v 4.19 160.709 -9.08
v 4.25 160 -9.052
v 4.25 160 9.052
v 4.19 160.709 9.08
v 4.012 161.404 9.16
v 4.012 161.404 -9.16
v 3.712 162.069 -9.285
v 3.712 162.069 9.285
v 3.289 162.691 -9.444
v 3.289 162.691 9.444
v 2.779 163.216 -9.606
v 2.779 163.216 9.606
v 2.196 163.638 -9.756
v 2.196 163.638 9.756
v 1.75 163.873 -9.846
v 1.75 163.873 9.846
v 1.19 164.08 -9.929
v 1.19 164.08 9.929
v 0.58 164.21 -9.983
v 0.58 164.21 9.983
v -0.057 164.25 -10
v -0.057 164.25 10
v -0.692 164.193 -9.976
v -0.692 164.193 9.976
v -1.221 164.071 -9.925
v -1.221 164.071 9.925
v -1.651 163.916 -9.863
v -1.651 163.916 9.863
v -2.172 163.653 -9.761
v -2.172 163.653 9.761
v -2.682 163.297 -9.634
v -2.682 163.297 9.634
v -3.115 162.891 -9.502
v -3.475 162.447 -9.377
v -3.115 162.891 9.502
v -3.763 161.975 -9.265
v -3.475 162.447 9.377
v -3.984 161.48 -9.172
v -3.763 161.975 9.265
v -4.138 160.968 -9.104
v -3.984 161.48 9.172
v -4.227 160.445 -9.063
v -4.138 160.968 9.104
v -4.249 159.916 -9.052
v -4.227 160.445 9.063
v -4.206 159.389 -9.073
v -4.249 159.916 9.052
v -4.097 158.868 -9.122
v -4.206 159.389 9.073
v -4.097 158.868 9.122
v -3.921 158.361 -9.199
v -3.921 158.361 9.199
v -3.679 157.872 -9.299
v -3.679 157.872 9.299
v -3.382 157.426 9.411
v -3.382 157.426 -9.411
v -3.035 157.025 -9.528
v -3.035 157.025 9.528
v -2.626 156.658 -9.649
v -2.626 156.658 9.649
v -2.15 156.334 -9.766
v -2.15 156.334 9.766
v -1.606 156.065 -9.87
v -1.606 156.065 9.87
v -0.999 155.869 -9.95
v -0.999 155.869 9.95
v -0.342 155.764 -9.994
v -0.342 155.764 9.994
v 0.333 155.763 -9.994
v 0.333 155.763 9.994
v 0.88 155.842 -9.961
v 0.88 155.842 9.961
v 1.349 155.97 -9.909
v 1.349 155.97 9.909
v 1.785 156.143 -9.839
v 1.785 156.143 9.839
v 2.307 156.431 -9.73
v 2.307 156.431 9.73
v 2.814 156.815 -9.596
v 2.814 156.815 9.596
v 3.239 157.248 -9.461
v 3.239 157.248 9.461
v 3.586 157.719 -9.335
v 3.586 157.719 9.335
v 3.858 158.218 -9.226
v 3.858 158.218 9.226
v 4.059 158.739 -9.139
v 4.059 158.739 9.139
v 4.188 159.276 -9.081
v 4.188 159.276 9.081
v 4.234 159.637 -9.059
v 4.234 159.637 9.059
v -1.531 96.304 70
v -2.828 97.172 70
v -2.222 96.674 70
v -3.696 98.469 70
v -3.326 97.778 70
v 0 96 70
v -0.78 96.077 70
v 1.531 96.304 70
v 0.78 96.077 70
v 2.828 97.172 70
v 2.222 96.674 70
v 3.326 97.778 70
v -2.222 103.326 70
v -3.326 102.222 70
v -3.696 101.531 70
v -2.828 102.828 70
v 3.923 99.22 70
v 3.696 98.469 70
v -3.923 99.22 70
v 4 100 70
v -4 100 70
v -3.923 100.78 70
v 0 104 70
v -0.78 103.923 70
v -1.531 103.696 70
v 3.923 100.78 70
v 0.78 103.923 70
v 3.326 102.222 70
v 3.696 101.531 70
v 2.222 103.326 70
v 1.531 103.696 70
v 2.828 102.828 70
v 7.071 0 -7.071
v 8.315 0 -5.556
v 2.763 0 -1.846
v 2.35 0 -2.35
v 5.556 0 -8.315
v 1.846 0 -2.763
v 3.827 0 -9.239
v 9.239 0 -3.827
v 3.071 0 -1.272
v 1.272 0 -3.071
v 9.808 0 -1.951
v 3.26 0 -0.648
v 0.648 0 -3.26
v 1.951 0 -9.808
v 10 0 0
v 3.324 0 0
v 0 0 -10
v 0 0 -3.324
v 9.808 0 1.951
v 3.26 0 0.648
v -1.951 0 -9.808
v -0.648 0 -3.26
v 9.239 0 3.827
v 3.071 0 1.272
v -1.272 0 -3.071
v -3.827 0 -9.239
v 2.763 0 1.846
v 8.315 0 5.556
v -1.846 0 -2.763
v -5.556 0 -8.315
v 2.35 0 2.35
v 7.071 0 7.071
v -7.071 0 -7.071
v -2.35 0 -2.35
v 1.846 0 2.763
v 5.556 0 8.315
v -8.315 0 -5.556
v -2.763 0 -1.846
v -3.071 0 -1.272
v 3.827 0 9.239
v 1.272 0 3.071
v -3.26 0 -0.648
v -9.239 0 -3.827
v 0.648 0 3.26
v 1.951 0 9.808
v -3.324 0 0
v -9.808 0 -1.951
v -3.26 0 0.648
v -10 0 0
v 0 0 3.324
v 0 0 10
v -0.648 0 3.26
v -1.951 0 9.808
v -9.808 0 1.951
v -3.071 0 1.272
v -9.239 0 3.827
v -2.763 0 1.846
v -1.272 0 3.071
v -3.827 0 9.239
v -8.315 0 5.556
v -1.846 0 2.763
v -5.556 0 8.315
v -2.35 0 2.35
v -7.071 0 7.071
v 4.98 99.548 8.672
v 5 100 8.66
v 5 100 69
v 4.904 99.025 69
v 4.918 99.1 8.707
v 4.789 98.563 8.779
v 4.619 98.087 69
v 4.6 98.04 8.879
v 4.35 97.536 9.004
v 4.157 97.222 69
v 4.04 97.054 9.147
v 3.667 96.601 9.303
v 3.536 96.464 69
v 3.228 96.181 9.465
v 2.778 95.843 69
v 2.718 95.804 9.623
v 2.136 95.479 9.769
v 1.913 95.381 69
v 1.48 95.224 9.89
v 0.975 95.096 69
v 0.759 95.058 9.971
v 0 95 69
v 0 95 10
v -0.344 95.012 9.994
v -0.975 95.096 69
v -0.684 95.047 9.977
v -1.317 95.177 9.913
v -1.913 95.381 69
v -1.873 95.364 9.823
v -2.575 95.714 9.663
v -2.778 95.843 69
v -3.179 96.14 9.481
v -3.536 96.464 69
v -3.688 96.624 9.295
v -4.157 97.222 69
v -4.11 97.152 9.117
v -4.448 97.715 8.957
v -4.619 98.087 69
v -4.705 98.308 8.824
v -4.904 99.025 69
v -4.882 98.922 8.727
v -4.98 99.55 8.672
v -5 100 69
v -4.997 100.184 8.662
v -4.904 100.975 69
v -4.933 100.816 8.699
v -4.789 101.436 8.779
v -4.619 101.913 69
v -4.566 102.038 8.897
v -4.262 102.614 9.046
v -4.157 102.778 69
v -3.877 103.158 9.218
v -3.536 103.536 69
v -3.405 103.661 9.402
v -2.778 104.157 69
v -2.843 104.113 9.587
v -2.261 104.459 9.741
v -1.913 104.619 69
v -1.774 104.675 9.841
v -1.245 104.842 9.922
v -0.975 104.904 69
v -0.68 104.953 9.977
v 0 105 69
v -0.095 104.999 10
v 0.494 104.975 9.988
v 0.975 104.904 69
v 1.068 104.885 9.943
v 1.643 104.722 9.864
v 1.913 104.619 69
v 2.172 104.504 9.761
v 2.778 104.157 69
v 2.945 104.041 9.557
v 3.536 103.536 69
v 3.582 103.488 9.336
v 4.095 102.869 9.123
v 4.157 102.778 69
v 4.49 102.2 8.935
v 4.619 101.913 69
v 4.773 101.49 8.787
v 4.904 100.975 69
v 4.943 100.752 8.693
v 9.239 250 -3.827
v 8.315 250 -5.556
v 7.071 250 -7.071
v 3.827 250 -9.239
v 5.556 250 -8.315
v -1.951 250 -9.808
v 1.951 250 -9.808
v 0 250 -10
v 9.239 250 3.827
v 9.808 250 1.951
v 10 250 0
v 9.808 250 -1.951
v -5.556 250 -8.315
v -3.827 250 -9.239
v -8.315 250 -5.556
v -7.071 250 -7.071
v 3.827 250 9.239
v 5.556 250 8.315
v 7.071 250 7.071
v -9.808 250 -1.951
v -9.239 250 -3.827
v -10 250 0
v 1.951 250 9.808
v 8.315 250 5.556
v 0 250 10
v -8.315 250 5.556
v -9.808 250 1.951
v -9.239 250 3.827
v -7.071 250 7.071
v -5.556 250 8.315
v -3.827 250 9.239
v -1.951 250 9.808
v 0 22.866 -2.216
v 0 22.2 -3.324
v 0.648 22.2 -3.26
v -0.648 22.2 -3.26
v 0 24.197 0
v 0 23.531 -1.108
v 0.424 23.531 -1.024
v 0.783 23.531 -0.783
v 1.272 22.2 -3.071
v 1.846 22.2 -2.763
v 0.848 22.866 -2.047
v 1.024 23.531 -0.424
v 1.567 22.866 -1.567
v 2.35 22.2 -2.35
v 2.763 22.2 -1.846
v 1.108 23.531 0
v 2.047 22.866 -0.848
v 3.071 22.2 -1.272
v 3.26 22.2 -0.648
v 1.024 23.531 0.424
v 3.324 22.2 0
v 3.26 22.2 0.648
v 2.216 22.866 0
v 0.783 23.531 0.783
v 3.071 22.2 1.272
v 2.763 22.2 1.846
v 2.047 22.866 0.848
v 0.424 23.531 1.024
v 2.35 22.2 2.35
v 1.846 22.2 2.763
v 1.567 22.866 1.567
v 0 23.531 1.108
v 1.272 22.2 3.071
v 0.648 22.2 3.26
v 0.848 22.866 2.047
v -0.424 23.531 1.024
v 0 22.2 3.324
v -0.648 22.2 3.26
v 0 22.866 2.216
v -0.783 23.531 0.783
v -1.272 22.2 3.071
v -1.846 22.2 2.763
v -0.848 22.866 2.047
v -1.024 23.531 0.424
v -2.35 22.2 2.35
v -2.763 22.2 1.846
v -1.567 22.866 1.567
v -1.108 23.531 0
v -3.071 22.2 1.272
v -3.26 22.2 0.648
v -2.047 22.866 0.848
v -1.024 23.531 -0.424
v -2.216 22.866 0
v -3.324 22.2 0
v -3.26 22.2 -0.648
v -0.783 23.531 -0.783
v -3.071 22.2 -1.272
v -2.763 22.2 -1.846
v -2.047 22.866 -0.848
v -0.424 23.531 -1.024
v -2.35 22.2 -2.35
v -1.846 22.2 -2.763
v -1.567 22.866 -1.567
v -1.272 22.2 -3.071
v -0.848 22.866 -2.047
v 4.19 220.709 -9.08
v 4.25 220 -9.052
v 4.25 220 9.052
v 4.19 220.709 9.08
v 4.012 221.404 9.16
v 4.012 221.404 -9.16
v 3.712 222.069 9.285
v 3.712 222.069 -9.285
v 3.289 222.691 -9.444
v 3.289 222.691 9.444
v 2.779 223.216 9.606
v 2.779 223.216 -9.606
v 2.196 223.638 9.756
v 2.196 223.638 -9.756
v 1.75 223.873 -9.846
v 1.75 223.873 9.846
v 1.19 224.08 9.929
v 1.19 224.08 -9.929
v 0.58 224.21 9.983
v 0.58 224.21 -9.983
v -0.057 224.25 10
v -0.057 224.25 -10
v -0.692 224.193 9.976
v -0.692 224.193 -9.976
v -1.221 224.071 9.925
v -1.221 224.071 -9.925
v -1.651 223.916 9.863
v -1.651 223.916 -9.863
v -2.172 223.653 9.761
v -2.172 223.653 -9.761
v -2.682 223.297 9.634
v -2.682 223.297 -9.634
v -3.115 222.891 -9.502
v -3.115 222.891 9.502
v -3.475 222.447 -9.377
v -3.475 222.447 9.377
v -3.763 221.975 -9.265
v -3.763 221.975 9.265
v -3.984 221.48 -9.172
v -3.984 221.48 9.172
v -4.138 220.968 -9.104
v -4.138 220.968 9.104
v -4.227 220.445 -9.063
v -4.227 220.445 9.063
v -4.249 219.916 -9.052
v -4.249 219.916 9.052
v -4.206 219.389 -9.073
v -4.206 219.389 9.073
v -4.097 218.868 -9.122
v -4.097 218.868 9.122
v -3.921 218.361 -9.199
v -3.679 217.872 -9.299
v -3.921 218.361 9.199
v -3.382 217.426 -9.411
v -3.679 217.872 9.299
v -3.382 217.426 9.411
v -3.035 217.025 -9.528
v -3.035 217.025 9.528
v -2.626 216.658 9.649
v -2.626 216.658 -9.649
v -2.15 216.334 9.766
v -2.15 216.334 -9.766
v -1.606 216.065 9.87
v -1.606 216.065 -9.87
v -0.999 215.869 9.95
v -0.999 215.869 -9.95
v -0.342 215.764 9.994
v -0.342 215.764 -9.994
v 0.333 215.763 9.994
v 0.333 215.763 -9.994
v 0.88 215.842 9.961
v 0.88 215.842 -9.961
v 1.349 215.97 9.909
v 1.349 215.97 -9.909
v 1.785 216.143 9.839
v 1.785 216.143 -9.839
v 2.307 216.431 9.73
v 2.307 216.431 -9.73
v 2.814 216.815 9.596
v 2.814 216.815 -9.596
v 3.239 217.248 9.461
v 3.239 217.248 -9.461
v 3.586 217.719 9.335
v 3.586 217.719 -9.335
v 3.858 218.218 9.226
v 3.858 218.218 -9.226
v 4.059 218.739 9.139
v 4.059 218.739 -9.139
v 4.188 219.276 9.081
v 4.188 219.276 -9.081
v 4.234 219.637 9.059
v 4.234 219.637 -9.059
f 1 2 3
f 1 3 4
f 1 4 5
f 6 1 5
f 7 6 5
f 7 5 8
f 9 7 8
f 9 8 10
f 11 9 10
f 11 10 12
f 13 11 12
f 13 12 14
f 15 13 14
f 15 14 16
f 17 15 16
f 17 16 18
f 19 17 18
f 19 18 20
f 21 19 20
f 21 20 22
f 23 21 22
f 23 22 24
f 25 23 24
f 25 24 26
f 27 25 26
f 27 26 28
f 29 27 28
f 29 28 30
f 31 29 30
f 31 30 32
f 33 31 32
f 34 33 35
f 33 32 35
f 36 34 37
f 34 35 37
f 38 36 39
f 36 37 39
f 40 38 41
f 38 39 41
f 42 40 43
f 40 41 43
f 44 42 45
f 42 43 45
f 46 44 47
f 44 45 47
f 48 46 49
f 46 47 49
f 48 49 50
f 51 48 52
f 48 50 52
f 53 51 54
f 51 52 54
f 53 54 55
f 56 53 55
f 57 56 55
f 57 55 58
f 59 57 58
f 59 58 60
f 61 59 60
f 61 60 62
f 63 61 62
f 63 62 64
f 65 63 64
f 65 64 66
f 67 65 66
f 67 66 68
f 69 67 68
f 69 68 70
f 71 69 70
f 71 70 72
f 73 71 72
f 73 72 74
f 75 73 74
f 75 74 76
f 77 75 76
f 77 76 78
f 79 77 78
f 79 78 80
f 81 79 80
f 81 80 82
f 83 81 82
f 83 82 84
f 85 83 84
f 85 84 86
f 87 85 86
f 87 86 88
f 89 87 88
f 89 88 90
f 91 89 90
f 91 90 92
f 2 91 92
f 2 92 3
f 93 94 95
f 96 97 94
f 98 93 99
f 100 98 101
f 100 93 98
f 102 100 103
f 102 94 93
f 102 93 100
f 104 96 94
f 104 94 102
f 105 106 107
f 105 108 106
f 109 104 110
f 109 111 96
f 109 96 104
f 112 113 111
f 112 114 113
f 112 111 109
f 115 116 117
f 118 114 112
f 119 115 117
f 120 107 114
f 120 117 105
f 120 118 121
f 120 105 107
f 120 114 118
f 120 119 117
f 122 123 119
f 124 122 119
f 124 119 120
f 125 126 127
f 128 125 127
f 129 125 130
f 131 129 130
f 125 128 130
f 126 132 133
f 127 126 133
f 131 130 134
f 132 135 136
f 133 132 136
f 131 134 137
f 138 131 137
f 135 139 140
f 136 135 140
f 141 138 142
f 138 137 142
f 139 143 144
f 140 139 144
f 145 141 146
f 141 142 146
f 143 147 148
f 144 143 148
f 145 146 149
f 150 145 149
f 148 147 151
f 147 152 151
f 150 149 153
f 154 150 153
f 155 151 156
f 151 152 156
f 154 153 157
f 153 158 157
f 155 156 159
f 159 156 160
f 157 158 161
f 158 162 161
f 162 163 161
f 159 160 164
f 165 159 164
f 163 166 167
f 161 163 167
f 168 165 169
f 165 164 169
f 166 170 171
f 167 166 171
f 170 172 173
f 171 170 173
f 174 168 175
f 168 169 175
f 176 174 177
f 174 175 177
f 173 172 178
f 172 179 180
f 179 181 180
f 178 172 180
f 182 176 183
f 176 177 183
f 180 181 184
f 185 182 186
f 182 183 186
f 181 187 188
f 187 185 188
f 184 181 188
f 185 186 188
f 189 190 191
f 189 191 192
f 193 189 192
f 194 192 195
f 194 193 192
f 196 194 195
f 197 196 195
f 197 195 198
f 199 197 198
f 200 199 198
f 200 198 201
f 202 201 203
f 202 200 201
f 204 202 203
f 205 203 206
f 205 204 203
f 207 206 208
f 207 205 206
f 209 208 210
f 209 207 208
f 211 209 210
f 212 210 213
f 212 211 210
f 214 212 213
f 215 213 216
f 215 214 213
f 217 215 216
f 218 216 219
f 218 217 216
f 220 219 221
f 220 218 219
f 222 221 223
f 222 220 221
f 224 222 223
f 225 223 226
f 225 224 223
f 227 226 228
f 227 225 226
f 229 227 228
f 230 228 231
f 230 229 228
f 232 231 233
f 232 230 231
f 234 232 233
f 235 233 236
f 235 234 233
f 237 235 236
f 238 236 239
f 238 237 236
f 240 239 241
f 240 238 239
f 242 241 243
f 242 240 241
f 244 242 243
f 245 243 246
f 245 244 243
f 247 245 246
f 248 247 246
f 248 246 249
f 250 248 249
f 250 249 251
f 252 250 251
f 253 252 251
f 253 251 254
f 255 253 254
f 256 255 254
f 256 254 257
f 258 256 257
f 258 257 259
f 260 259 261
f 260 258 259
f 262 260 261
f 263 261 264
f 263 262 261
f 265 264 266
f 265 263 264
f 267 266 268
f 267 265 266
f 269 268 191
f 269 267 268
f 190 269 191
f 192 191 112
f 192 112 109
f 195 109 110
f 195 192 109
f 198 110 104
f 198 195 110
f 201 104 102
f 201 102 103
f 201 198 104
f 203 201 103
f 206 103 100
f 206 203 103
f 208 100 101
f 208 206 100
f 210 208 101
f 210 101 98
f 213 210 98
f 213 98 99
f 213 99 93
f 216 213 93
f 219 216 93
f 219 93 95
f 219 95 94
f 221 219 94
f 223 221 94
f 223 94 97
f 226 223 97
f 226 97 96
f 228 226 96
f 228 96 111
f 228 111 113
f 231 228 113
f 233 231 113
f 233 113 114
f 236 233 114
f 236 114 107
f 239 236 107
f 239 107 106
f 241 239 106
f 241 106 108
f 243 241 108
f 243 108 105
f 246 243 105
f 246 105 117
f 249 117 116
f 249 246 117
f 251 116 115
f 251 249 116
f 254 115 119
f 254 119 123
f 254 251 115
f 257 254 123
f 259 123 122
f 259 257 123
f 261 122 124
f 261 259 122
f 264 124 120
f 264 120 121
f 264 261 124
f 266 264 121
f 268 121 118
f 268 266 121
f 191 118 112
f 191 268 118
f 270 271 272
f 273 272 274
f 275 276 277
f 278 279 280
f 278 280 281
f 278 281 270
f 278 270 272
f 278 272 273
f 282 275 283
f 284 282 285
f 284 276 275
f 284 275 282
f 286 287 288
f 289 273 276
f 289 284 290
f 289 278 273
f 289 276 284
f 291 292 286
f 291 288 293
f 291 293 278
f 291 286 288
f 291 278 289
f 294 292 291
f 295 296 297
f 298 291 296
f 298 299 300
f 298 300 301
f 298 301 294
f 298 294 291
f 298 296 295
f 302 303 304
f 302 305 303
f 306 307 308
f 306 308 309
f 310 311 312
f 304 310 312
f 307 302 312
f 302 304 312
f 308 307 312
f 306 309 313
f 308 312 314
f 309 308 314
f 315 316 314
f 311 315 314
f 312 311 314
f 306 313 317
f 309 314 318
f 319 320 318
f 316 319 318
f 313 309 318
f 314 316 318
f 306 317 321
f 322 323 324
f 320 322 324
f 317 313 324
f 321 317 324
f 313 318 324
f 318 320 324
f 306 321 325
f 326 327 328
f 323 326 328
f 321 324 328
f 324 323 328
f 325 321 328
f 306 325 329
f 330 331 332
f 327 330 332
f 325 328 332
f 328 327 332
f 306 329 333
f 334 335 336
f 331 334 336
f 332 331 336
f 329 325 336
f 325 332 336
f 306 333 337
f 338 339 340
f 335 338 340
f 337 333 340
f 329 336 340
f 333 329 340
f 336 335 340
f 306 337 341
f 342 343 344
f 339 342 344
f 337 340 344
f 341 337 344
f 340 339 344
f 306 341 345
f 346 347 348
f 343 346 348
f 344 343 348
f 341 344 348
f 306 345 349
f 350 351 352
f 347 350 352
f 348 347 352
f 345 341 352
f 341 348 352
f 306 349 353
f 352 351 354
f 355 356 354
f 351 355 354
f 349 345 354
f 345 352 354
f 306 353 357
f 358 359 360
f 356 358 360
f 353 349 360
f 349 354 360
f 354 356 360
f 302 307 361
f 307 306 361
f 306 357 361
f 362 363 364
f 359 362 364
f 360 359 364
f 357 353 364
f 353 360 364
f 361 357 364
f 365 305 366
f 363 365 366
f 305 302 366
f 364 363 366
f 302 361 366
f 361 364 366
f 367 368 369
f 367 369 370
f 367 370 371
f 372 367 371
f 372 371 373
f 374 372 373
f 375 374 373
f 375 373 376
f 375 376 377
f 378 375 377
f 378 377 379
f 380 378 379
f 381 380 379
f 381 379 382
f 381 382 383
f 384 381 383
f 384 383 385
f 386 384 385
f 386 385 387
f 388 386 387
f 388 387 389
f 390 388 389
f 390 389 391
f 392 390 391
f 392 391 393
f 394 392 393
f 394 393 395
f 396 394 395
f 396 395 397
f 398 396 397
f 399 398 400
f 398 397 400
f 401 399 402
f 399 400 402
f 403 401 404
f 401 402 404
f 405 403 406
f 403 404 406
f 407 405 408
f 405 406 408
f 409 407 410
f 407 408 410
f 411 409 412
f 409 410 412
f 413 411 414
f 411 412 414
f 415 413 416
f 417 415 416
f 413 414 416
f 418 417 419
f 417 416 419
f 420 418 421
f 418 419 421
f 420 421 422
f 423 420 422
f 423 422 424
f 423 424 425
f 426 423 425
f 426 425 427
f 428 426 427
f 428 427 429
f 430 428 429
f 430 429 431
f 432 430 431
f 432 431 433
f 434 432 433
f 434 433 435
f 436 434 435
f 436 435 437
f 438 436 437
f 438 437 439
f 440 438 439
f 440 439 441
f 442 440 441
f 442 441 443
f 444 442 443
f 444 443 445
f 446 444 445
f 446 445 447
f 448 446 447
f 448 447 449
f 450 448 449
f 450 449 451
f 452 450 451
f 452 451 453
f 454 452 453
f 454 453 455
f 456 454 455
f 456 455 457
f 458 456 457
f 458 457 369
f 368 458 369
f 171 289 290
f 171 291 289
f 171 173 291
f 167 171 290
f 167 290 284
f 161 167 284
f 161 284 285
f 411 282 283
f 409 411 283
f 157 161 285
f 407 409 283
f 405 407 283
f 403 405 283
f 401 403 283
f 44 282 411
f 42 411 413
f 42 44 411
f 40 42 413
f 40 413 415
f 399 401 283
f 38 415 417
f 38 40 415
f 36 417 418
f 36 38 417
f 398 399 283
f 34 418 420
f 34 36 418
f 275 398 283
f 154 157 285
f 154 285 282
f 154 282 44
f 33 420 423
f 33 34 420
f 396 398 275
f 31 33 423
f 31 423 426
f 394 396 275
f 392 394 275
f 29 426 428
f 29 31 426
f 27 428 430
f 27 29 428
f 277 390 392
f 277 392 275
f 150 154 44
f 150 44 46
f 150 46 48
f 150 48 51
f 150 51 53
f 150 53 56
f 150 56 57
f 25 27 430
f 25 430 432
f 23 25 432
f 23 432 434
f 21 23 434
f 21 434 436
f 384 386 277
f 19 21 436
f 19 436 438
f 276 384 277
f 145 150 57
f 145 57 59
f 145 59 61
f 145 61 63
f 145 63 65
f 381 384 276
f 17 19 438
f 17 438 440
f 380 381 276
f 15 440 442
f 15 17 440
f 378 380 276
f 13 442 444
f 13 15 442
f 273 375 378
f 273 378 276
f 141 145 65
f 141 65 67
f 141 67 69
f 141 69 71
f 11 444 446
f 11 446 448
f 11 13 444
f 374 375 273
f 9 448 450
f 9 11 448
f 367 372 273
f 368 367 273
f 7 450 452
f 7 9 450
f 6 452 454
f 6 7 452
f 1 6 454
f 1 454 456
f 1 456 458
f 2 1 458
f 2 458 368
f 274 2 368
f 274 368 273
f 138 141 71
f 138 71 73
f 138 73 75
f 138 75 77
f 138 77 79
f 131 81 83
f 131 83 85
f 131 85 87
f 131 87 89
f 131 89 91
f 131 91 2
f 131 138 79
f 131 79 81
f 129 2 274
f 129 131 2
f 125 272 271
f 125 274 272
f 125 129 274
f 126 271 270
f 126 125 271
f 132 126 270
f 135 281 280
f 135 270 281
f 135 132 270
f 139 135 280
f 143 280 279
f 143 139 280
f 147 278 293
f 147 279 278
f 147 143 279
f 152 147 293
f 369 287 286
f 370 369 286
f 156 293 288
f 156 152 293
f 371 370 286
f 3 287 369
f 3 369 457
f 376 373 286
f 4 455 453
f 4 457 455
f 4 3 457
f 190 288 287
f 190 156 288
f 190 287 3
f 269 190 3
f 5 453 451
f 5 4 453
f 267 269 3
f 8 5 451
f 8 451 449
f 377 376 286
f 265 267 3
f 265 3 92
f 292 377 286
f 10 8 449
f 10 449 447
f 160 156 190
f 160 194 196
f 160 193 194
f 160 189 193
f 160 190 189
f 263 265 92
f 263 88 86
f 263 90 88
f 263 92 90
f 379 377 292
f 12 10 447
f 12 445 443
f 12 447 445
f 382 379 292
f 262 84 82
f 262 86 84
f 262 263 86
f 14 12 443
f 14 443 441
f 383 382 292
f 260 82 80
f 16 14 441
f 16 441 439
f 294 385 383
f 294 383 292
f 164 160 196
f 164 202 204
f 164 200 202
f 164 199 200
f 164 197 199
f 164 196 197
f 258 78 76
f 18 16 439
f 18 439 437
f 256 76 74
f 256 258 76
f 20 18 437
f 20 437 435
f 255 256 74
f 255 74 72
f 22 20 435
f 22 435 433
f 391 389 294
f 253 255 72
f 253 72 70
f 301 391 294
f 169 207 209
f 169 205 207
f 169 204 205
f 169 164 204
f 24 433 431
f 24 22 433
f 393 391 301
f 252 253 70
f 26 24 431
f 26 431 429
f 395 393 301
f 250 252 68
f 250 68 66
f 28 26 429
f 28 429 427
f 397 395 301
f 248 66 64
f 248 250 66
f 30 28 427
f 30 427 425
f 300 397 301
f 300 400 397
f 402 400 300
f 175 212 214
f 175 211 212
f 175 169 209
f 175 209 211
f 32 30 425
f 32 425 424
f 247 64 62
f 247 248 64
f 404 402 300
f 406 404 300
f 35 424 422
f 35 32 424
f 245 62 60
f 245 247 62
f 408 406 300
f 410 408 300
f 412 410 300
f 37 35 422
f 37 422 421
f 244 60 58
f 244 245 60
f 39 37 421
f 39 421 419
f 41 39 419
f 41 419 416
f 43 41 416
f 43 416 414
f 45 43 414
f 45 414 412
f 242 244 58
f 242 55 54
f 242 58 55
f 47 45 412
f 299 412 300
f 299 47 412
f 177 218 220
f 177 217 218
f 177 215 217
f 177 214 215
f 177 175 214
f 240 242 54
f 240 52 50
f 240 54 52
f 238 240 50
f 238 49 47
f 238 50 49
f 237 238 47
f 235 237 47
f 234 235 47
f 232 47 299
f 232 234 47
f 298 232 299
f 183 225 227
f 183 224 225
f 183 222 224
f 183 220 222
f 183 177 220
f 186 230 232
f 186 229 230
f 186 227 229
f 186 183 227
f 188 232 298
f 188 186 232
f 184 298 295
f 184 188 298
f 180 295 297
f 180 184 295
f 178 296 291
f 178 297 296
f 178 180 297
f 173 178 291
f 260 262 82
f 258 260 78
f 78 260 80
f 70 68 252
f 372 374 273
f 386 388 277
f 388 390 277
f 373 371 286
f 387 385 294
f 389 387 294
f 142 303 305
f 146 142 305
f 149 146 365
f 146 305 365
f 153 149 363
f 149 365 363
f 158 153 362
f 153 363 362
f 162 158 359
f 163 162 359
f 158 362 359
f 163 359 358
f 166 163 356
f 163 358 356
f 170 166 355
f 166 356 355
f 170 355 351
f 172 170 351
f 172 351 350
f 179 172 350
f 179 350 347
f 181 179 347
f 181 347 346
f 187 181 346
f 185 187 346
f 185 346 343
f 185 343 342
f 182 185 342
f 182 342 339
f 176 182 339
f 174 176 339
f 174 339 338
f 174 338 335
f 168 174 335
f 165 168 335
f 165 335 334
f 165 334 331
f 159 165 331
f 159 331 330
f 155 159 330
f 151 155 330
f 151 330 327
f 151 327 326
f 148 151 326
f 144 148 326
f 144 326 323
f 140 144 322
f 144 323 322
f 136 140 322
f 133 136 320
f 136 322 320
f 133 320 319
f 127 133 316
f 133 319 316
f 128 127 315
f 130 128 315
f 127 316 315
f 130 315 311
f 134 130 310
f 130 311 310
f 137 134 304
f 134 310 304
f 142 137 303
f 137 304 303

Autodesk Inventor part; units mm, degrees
ref_plane "YZ Plane" through (0, 0, 0) normal (1, 0, 0) x (0, 1, 0)
ref_plane "XZ Plane" through (0, 0, 0) normal (0, 1, 0) x (-1, 0, 0)
sketch "Skizze1" plane through (0, 0, 0) normal (0, 1, 0) x (-1, 0, 0)
  circle A0 centre (0, 0) radius 10
  dimension "d17" = 20
extrude "Extrusion1" add sketch "Skizze1" along normal blind 250
sketch "Skizze4" plane through (0, 0, 0) normal (0, 0, 1) x (1, 0, 0)
  line L0 (0, 0) -> (0, 100)
  circle A0 centre (0, 100) radius 5
  dimension "d10" = 100
  dimension "d11" = 10
extrude "Extrusion3" add sketch "Skizze4" along normal blind 70
ref_plane "Arbeitsebene1" through (0, 0, 3.5) normal (0, 0, 1) x (1, 0, 0)
sketch "Skizze6" plane through (0, 0, 3.5) normal (0, 0, 1) x (1, 0, 0)
  line L0 (10, 250) -> (-10, 250) projected
  line L1 (0, 250) -> (0, 220)
  circle A0 centre (0, 220) radius 4.25
  line L2 (0, 220) -> (0, 160)
  circle A1 centre (0, 160) radius 4.25
  point P0 (0, 0)
  dimension "d19" = 30
  dimension "d20" = 8.5
  dimension "d21" = 60
  dimension "d22" = 8.5
extrude "Extrusion5" cut sketch "Skizze6" along normal through all both and the other way through all
chamfer "Fasen1" distance 1 angle 45 1 edges at (-5, 100, 70)
thread "Gewinde2" size "M10x1.5" class "6g" standard "ANSI Metric M Profile" length 20
sketch "Skizze7" plane through (0, 0, 0) normal (0, -1, 0) x (1, 0, 0)
  point P0 (0, 0)
hole "Bohrung1" at (0, 0, 0) direction (0, 1, 0) diameter 6.647 depth 22.2 tip angle 118 thread size "M8x1.25" class "6H" standard "ISO Metric profile"
properties part number "Ruderstange" material "Edelstahl"
